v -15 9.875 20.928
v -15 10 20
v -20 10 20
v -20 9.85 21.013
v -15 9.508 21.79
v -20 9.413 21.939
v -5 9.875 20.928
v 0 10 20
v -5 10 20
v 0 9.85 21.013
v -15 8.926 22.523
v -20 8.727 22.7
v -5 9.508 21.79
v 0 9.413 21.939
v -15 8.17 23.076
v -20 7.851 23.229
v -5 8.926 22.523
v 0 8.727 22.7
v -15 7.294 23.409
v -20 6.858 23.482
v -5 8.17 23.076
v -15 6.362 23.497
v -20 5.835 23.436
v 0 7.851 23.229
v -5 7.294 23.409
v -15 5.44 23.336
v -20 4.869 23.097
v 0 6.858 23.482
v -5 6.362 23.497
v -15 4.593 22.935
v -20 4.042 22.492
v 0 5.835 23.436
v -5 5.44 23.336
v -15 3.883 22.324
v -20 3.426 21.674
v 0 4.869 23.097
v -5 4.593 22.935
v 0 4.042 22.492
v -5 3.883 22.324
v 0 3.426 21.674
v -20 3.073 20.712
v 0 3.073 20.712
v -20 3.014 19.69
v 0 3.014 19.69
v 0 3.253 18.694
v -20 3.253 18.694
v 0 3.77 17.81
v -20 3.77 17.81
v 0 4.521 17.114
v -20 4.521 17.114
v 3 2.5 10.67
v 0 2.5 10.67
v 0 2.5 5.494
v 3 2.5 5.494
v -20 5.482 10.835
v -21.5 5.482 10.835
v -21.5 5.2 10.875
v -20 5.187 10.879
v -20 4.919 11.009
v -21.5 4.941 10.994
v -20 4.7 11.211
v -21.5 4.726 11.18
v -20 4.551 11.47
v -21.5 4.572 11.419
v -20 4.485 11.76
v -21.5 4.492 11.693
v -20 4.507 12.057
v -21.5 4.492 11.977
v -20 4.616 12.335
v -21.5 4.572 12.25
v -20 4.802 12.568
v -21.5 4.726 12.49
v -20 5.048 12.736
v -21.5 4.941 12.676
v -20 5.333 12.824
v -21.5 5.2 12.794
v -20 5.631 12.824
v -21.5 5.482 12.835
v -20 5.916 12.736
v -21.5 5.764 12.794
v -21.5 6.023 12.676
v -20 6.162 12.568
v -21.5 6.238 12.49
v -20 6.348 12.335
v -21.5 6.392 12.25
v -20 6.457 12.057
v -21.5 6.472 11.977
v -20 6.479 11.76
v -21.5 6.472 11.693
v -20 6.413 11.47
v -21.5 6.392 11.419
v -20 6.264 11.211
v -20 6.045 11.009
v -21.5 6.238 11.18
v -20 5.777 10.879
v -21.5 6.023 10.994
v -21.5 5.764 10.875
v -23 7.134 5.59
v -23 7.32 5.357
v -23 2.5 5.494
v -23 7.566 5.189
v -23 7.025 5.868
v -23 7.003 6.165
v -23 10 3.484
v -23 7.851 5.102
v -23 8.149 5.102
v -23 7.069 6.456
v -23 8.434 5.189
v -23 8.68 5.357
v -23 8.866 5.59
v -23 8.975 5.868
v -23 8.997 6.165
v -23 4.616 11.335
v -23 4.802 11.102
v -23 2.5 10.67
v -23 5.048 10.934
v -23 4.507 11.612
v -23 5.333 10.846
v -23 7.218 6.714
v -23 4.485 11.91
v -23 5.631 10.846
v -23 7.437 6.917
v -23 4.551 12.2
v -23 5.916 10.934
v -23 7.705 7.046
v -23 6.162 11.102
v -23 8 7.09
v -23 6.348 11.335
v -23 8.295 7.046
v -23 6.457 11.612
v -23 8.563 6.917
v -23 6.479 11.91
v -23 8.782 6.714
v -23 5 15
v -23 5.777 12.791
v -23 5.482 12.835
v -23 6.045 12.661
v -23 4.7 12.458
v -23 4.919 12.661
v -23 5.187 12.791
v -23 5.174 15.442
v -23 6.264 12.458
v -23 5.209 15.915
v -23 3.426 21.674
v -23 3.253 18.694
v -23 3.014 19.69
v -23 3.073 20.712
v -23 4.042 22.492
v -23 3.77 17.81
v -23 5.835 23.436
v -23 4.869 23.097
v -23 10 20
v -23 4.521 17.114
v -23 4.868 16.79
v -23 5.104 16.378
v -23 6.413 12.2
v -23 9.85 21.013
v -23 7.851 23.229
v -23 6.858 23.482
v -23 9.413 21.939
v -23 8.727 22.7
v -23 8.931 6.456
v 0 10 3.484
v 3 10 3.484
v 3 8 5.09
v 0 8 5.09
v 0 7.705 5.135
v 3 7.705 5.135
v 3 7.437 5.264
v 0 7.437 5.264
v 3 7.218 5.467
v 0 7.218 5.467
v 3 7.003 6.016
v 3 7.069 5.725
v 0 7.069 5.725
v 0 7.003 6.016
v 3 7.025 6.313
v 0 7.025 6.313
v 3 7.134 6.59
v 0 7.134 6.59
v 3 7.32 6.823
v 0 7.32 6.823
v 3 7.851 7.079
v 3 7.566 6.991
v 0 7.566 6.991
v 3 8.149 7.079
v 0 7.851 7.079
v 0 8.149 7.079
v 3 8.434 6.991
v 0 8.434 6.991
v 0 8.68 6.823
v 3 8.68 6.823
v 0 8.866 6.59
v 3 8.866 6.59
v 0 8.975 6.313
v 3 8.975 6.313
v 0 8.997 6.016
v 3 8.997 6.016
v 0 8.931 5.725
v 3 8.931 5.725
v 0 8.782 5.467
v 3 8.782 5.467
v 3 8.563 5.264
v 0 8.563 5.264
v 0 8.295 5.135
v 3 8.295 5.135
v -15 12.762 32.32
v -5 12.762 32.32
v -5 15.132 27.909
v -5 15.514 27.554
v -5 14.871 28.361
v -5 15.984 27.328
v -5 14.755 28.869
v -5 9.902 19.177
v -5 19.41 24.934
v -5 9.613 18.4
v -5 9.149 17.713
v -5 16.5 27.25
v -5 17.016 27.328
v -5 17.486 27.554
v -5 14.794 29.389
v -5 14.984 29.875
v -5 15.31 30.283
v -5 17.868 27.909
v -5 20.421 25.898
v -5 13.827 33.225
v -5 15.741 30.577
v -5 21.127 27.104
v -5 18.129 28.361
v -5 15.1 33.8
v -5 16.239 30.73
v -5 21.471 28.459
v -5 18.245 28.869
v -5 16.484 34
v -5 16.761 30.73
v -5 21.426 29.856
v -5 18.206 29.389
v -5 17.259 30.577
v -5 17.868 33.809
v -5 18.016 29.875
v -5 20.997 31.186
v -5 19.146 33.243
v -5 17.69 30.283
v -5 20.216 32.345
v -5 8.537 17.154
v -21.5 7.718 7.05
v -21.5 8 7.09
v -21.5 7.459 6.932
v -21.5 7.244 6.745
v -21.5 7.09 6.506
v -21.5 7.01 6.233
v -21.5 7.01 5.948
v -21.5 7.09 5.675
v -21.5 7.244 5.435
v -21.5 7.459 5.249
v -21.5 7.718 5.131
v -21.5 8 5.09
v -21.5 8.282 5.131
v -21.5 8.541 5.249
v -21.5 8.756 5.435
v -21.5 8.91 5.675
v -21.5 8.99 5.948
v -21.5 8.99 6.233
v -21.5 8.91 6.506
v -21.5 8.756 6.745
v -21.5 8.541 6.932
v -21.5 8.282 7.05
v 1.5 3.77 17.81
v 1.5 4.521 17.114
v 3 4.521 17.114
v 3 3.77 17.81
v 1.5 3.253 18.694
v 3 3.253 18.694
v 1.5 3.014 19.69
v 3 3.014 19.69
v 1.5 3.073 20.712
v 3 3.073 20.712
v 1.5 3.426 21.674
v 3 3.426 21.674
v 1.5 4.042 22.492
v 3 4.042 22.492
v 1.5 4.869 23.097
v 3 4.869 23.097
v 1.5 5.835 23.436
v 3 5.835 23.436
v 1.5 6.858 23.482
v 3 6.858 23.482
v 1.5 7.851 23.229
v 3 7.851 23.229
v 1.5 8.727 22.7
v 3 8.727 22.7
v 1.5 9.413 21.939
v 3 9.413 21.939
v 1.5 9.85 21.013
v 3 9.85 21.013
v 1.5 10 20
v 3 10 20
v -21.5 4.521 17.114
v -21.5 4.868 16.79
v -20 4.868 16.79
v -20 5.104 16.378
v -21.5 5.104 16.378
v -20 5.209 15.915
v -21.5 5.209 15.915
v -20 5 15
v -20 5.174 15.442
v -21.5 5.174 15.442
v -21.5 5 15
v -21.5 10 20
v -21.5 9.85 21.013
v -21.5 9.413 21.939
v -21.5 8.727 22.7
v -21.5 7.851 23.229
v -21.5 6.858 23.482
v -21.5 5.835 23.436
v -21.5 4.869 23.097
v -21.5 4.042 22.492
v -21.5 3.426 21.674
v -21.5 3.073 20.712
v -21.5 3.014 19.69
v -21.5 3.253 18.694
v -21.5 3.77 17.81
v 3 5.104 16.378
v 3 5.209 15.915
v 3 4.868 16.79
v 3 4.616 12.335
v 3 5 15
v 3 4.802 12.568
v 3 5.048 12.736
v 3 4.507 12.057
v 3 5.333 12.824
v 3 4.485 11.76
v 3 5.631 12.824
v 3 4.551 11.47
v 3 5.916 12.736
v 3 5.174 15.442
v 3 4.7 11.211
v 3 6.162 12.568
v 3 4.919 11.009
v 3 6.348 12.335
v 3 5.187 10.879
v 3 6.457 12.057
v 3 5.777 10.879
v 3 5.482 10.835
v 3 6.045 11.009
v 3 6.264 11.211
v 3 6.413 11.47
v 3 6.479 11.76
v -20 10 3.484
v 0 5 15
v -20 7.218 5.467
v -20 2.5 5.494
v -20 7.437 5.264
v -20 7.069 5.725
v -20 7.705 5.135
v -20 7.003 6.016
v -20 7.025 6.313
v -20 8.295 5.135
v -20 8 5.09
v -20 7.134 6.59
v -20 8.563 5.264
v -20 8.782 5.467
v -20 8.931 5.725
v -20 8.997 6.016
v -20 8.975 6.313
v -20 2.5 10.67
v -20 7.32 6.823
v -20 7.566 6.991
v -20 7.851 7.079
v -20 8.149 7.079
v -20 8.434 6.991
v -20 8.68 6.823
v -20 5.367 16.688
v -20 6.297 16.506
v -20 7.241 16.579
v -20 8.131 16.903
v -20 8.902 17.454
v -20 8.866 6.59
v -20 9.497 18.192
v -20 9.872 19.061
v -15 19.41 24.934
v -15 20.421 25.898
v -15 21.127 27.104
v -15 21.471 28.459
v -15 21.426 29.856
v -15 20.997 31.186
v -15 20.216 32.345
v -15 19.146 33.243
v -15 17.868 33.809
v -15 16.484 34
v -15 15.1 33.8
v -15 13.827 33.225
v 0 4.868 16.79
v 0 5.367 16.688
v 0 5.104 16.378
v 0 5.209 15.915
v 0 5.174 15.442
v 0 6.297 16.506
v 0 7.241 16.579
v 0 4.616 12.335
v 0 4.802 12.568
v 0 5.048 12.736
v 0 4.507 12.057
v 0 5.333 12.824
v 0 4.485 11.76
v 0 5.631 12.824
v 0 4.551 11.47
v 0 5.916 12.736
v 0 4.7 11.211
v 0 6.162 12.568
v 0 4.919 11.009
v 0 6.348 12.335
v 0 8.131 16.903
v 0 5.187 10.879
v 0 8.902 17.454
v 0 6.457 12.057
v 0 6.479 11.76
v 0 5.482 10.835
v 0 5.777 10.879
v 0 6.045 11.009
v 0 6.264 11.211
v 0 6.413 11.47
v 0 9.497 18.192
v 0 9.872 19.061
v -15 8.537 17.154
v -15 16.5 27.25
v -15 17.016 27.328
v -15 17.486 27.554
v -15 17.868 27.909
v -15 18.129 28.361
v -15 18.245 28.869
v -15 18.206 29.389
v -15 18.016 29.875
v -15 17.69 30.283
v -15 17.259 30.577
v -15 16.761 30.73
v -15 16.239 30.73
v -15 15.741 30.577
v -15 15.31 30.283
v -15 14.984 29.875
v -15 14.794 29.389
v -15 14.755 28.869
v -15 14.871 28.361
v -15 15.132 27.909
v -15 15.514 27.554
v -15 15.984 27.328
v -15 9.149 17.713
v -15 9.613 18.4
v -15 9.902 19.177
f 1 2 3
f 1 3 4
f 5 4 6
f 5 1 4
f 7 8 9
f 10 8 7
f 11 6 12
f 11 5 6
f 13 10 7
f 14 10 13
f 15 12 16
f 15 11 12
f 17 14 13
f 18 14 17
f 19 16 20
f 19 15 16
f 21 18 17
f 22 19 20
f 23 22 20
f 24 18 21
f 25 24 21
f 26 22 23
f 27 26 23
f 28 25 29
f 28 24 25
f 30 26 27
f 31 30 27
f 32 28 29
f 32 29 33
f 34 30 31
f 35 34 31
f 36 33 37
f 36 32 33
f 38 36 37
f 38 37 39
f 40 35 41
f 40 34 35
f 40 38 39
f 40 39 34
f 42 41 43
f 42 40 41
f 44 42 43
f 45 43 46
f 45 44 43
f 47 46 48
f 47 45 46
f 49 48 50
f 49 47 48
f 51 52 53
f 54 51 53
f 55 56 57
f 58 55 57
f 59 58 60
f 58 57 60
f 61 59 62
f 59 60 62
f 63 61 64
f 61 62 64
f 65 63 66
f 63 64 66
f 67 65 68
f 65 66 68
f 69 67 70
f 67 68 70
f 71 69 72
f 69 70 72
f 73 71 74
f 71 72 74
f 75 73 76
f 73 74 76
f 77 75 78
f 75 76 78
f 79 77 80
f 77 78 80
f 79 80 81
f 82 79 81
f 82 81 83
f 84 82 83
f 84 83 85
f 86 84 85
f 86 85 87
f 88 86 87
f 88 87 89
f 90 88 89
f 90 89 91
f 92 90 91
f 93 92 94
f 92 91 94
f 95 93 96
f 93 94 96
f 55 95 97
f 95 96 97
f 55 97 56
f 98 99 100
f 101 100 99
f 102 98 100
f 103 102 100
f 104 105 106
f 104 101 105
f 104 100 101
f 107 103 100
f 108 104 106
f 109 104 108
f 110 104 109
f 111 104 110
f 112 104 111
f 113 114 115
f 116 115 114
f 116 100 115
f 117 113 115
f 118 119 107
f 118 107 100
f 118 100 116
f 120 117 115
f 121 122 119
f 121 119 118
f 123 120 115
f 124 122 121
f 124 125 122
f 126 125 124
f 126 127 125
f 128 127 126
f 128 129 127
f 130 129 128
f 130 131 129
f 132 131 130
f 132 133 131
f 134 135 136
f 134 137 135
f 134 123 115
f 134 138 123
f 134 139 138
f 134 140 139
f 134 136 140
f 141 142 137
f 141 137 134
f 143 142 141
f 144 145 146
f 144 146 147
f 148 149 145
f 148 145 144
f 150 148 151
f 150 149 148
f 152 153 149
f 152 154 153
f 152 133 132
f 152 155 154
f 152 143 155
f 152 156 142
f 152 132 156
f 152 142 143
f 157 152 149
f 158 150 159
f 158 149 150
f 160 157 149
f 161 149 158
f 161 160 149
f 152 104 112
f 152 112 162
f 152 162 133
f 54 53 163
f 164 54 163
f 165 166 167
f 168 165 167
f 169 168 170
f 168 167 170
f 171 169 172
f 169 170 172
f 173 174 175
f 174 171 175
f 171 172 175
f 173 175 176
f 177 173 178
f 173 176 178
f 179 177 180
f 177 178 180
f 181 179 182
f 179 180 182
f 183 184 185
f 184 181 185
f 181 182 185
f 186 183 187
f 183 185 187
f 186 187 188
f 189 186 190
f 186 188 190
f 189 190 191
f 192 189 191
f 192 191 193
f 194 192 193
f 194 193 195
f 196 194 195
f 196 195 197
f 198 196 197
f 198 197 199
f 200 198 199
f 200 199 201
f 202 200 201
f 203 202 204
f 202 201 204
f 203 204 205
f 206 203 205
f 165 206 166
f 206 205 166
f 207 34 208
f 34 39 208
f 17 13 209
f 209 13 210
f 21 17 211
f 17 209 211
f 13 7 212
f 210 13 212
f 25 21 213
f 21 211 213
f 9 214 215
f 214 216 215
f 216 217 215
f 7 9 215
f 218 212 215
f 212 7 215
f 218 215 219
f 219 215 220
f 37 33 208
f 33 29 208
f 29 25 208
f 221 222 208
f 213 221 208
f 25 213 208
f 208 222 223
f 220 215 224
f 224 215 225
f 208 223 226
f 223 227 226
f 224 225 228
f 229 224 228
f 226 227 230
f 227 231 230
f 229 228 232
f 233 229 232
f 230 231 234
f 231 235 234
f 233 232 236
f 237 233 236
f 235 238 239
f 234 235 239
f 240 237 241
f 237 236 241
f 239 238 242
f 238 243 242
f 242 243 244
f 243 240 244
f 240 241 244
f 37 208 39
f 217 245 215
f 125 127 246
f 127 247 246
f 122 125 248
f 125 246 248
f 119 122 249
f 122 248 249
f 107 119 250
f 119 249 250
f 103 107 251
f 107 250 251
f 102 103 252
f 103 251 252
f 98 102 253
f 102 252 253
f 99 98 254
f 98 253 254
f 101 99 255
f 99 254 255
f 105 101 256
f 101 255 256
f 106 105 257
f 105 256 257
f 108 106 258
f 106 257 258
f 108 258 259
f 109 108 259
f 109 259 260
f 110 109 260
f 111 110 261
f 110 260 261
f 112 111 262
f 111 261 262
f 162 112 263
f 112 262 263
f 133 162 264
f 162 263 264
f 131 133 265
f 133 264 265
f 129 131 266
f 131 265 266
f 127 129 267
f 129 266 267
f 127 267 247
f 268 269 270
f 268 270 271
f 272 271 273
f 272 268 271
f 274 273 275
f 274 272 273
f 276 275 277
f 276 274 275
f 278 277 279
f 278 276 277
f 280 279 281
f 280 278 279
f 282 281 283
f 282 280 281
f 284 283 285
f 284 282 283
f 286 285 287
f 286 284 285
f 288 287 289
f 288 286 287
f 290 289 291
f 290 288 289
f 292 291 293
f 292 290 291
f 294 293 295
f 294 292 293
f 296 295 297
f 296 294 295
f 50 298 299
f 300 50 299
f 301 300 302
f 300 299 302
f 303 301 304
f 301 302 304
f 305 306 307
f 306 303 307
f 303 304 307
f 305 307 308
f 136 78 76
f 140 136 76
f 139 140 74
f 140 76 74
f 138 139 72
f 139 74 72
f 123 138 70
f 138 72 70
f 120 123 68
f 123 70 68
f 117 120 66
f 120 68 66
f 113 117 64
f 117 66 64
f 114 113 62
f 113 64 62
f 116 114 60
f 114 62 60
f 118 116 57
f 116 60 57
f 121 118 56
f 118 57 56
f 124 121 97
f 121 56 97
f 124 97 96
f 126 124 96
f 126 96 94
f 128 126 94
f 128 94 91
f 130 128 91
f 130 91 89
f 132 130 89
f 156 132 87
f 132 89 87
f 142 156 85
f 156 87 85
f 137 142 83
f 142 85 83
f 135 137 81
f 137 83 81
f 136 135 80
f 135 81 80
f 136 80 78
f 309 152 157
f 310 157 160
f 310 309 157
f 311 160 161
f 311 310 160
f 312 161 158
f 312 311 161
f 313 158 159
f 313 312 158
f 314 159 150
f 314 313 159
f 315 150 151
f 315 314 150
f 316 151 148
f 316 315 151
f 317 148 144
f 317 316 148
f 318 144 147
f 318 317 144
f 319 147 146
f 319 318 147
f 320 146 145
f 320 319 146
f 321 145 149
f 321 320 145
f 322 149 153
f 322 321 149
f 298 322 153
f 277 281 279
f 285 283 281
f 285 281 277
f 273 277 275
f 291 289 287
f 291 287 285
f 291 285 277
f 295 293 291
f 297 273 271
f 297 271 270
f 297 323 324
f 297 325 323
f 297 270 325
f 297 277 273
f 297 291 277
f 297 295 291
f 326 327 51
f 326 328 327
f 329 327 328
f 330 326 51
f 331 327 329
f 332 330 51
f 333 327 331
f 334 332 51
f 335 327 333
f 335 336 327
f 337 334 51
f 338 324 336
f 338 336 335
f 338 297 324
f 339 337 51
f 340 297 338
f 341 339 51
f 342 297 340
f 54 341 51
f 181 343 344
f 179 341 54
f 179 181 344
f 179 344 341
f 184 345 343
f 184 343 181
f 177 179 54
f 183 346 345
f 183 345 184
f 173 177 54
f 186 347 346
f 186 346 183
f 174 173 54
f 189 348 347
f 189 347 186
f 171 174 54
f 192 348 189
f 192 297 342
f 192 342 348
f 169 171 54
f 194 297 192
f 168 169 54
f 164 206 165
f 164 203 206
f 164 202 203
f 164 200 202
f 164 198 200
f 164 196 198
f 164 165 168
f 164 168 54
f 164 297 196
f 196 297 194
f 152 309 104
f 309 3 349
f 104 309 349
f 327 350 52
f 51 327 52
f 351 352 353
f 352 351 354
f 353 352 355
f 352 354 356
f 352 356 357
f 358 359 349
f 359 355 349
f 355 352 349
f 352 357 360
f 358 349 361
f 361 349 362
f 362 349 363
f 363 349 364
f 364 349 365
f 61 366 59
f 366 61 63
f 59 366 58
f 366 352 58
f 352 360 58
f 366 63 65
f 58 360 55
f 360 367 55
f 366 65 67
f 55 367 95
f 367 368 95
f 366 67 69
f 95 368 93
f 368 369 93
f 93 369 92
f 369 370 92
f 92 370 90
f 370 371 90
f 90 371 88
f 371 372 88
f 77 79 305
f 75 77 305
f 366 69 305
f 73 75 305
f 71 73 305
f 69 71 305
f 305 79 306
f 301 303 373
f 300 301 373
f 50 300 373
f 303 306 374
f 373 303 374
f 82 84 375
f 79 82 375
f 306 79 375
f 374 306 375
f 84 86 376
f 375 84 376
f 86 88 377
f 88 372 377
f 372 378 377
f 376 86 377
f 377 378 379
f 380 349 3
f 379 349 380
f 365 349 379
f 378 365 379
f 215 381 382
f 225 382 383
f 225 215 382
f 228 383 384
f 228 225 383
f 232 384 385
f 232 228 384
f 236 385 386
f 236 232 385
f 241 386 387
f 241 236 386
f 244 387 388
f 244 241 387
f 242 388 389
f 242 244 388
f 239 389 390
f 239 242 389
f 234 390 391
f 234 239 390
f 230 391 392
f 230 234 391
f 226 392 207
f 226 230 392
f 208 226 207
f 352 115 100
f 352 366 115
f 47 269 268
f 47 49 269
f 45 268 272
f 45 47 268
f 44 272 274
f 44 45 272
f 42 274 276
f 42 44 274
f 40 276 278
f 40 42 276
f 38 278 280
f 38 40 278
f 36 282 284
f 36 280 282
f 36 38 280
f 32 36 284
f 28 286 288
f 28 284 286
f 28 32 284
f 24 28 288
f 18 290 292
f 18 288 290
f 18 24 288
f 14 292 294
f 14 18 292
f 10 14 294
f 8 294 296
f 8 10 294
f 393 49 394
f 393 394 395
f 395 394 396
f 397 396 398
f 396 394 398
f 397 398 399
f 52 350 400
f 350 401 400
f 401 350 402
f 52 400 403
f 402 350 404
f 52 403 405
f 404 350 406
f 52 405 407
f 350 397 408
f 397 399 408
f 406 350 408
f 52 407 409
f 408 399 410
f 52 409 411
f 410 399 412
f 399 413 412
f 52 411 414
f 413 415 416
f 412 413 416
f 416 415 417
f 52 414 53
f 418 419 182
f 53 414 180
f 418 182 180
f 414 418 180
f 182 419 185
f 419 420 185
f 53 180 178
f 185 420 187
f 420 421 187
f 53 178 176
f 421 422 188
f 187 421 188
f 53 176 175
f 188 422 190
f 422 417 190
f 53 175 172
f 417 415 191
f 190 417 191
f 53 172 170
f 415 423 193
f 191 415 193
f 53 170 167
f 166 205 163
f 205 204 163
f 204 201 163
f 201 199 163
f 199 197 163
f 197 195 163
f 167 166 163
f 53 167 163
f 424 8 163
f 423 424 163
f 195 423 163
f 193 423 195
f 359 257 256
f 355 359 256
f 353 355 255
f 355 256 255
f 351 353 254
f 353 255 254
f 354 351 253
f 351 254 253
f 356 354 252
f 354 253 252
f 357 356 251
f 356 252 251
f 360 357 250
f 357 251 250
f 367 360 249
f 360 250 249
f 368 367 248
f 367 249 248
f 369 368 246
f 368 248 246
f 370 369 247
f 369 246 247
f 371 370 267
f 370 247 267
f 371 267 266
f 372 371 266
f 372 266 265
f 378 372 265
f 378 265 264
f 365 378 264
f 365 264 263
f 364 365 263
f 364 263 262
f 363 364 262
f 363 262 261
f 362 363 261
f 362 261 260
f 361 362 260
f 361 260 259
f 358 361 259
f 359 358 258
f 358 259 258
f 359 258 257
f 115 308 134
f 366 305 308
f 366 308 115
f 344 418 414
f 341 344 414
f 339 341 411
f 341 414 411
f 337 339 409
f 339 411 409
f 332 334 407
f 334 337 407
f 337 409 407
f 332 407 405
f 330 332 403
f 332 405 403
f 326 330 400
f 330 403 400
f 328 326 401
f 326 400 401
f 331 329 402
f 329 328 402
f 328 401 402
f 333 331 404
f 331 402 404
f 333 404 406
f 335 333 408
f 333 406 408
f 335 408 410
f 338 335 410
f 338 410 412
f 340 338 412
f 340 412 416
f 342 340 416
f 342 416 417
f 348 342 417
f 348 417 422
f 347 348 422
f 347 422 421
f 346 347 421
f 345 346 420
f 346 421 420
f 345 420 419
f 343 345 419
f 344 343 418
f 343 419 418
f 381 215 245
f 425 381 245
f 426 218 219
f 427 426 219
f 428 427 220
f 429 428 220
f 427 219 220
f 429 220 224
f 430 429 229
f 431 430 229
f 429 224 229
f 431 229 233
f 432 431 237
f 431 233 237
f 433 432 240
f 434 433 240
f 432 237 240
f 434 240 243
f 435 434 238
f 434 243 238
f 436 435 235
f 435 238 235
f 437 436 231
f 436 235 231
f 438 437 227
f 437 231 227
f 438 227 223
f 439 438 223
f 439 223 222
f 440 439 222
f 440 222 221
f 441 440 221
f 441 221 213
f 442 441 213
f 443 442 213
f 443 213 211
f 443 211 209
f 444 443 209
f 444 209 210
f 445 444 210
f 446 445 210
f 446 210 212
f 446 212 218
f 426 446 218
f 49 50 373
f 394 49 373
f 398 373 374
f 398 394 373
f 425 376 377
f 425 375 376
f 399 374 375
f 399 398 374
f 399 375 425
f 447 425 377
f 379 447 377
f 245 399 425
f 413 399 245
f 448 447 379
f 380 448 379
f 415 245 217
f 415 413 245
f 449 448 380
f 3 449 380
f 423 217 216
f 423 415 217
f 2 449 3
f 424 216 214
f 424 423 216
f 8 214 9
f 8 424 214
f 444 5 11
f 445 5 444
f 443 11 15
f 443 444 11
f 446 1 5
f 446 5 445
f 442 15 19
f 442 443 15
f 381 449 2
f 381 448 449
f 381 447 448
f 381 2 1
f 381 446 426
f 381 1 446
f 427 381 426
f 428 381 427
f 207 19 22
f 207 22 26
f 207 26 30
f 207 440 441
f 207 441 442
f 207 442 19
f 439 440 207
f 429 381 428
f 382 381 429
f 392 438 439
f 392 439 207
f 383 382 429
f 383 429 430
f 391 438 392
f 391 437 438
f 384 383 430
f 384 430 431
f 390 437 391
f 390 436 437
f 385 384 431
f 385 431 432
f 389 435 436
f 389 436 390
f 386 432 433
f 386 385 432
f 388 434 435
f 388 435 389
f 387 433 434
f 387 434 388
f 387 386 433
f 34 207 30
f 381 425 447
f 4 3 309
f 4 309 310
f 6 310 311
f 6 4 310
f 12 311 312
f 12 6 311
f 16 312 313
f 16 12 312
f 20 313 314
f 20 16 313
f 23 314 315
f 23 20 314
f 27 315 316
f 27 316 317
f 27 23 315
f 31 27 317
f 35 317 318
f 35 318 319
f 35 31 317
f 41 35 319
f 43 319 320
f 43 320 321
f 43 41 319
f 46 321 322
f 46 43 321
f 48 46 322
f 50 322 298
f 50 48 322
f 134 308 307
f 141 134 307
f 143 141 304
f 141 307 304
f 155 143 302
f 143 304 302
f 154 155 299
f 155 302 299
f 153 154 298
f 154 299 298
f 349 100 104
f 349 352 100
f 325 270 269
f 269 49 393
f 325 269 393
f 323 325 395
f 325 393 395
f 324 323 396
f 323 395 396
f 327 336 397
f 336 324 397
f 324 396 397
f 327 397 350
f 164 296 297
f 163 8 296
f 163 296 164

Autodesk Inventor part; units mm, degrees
ref_plane "YZ Plane" through (0, 0, 0) normal (1, 0, 0) x (0, 1, 0)
ref_plane "XZ Plane" through (0, 0, 0) normal (0, 1, 0) x (-1, 0, 0)
sketch "スケッチ1" plane through (0, 0, 0) normal (1, 0, 0) x (0, 1, 0)
  line L0 (0, 0) -> (10, 0)
  line L1 (10, 0) -> (10, 15)
  line L2 (10, 15) -> (0, 15)
  line L3 (0, 15) -> (0, 0)
  circle A0 centre (6.5, 20) radius 1.6
  circle A1 centre (6.5, 20) radius 3.5
  line L4 (10, 15) -> (-0.0411, 15)
  dimension "d0" = 10
  dimension "d1" = 15
  dimension "d2" = 3.2
  dimension "d3" = 7
  dimension "d7" = 5
extrude "プレート1" add sketch "スケッチ1" along normal blind 1.5
sketch "スケッチ2" plane through (1.5, 0, 0) normal (1, 0, 0) x (0, 0, -1)
  line L0 (-15, 5) -> (-15, 10) projected
  line L1 (-15, 10) -> (-3.4839, 10) projected
  line L2 (-3.4839, 10) -> (-5.4935, 2.5) projected
  line L3 (-5.4935, 2.5) -> (-10.6699, 2.5) projected
  line L4 (-10.6699, 2.5) -> (-15, 5) projected
  line L5 (-15, 10) -> (0, 10) projected
  line L6 (-15, 0) -> (-15, 10) projected
  line L7 (0, 0) -> (-15, 0) projected
  line L8 (0, 10) -> (0, 0) projected
extrude "切り取り1" cut sketch "スケッチ2" against normal blind 1.5 contours L4 L3 L2 L5 L8 L7 L6
sketch "スケッチ3" plane through (1.5, 0, 0) normal (1, 0, 0) x (0, 0, -1)
  line L0 (-3.4839, 10) -> (-15, 10)
  line L1 (-15, 10) -> (-20, 10)
  circle A0 centre (-20, 6.5) radius 3.5
  line L2 (-10.6699, 2.5) -> (-15, 5)
  arc A1 (-15, 5) -> (-17.1135, 4.5206) centre (-15.7977, 3.6183) ccw
  line L3 (-15, 5) -> (-10.6699, 2.5)
  circle A2 centre (-20, 6.5) radius 3.5
  line L4 (-15, 5) -> (-15, 10)
  point P0 (0, 0)
  dimension "d13" = 1.5
sheet face with bend "面2" sketch "スケッチ3" thickness 1.5 toward (-1, 0, 0) bend radius 1.5 contours L4 A1 A0 L1
bend "曲げ1"
sketch "スケッチ4" plane through (1.5, 0, 0) normal (1, 0, 0) x (0, 0, -1)
  circle A0 centre (-6.0903, 8) radius 1
  line L0 (-20, 10) -> (-3.4839, 10) projected
  line L1 (-5.4935, 2.5) -> (-3.4839, 10) projected
  circle A1 centre (-11.8349, 5.4821) radius 1
  line L2 (-15, 5) -> (-10.6699, 2.5) projected
  line L3 (-11.8349, 5.4821) -> (-12.8349, 3.75)
  point P0 (0, 0)
  dimension "d14" = 2
  dimension "d15" = 2
  dimension "d16" = 2
  dimension "d17" = 2
extrude "切り取り2" cut sketch "スケッチ4" against normal blind 1.5
sketch "スケッチ5" plane through (1.5, 0, 0) normal (1, 0, 0) x (0, 0, -1)
  circle A0 centre (-20, 6.5) radius 3.5
  arc A1 (-20, 10) -> (-17.1135, 4.5206) centre (-20, 6.5) ccw projected
  point P0 (0, 0)
extrude "押し出し1" add sketch "スケッチ5" against normal blind 11.5
mirror "ミラー1" about plane through (-10, 6.5, 20) normal (-1, 0, 0)
sketch "スケッチ6" plane through (1.5, 0, 0) normal (1, 0, 0) x (0, 0, -1)
  arc A0 (-15, 5) -> (-17.1135, 4.5206) centre (-15.7977, 3.6183) ccw projected
  line L0 (-15, 5) -> (-10.6699, 2.5) projected
  line L1 (-10.6699, 2.5) -> (-5.4935, 2.5) projected
  line L2 (-5.4935, 2.5) -> (-3.4839, 10) projected
  line L3 (-20, 10) -> (-3.4839, 10) projected
  arc A1 (-20, 10) -> (-17.1135, 4.5206) centre (-20, 6.5) ccw projected
  circle A2 centre (-6.0903, 8) radius 1 projected
  circle A3 centre (-11.8349, 5.4821) radius 1 projected
  point P0 (0, 0)
extrude "押し出し2" add sketch "スケッチ6" along normal blind 1.5
sketch "スケッチ7" plane through (-21.5, 10, 3.4839) normal (-1, 0, 0) x (0, 0, 1)
  arc A0 (13.6296, -5.4794) -> (11.5161, -5) centre (12.3138, -6.3817) ccw projected
  arc A1 (13.6296, -5.4794) -> (16.5161, 0) centre (16.5161, -3.5) ccw projected
  line L0 (16.5161, 0) -> (0, 0) projected
  line L1 (2.0096, -7.5) -> (0, 0) projected
  line L2 (7.186, -7.5) -> (2.0096, -7.5) projected
  line L3 (11.5161, -5) -> (7.186, -7.5) projected
  circle A2 centre (2.6065, -2) radius 1 projected
  circle A3 centre (8.3511, -4.5179) radius 1 projected
  point P0 (-3.4839, -10)
extrude "押し出し3" add sketch "スケッチ7" along normal blind 1.5
ref_plane "作業平面1" through (-10, 10, 3.4839) normal (-1, 0, 0) x (0, 0, 1)
sketch "スケッチ8" plane through (-10, 10, 3.4839) normal (-1, 0, 0) x (0, 0, 1)
  circle A0 centre (25.5161, 6.5) radius 5
  arc A1 (13.6296, -5.4794) -> (16.5161, 0) centre (16.5161, -3.5) ccw projected
  line L0 (18.8404, -6.1168) -> (28.8365, 2.7617)
  line L1 (21.4499, 9.4096) -> (13.6698, -1.4633)
  circle A2 centre (16.5161, -3.5) radius 3.5
  arc A3 (16.5161, 0) -> (13.6296, -5.4794) centre (16.5161, -3.5) ccw projected
  point P0 (-3.4839, -10)
  point P1 (13.6698, -1.4633)
  dimension "d26" = 10
  dimension "d27" = 10
  dimension "d28" = 9
extrude "押し出し4" add sketch "スケッチ8" along normal mid plane 10 contours A0 | A0 L0 A1 A2 L1
sketch "スケッチ9" plane through (-5, 10, 3.4839) normal (1, 0, 0) x (0, 0, -1)
  arc A0 (-21.4499, 9.4096) -> (-28.8365, 2.7617) centre (-25.5161, 6.5) ccw projected
  circle A1 centre (-25.5161, 6.5) radius 1.75
  point P0 (3.4839, -10)
  dimension "d31" = 3.5
extrude "押し出し5" cut sketch "スケッチ9" against normal through all
equation "\"d5\" = Thickness"
equation "\"d17\" = d16"
equation "\"d18\" = Thickness"
equation "\"d4\" = Thickness"
equation "\"d8\" = BendRadius"
equation "\"d9\" = BendReliefWidth"
equation "\"d11\" = MinimumRemnant"
equation "\"d10\" = BendReliefDepth"
equation "\"d12\" = TransitionRadius"
equation "\"BendRadius\" = Thickness"
equation "\"BendReliefWidth\" = Thickness"
equation "\"BendReliefDepth\" = 0.5 * Thickness"
equation "\"CornerReliefSize\" = 4 * Thickness"
equation "\"MinimumRemnant\" = 2 * Thickness"
equation "\"TransitionRadius\" = BendRadius"
equation "\"JacobiRadiusSize\" = BendRadius"
equation "\"GapSize\" = Thickness"
equation "\"Thickness\" = 1.5"
properties part number "board_setter_joint"
